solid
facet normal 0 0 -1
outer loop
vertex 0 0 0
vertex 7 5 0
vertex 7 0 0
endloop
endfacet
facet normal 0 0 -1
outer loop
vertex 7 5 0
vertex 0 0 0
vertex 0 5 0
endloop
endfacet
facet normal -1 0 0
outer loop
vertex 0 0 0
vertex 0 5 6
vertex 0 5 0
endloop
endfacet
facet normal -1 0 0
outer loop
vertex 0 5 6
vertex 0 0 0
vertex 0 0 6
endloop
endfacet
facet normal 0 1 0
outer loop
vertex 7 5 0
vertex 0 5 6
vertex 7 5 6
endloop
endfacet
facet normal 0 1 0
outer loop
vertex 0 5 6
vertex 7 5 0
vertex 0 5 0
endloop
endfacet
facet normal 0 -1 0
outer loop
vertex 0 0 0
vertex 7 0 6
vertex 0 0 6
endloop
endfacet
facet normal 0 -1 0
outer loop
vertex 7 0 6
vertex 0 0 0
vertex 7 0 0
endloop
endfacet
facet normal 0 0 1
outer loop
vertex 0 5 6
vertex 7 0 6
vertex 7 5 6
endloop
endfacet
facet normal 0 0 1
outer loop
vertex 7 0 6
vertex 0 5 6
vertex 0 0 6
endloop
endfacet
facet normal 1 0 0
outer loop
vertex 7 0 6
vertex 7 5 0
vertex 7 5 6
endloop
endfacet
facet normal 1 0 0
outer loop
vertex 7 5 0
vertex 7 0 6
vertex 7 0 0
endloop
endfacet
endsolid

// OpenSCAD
translate([1.5, 2.5, 1.0]) color([0.29938666187805807, 0.4167493264442593, 0.9263964007964989]) cube([3, 5, 2], center=true);
translate([1.5, 2.5, 3.0]) color([0.5910765187605377, 0.2980281087530109, 0.35456411603507165]) cube([3, 5, 2], center=true);
translate([1.5, 2.5, 5.0]) color([0.24805850121983253, 0.6327789974902275, 0.6370445113549524]) cube([3, 5, 2], center=true);
translate([4.0, 2.5, 1.5]) color([0.5292072971005523, 0.376431751315491, 0.008427608141492793]) cube([2, 5, 3], center=true);
translate([4.0, 2.5, 4.5]) color([0.9619565585865117, 0.901262330417864, 0.44129738363616366]) cube([2, 5, 3], center=true);
translate([6.0, 2.5, 1.5]) color([0.3715965769686672, 0.9523409342086877, 0.09105648808381206]) cube([2, 5, 3], center=true);
translate([6.0, 2.5, 4.5]) color([0.18545820412424963, 0.10861526636012075, 0.11215874223546374]) cube([2, 5, 3], center=true);
